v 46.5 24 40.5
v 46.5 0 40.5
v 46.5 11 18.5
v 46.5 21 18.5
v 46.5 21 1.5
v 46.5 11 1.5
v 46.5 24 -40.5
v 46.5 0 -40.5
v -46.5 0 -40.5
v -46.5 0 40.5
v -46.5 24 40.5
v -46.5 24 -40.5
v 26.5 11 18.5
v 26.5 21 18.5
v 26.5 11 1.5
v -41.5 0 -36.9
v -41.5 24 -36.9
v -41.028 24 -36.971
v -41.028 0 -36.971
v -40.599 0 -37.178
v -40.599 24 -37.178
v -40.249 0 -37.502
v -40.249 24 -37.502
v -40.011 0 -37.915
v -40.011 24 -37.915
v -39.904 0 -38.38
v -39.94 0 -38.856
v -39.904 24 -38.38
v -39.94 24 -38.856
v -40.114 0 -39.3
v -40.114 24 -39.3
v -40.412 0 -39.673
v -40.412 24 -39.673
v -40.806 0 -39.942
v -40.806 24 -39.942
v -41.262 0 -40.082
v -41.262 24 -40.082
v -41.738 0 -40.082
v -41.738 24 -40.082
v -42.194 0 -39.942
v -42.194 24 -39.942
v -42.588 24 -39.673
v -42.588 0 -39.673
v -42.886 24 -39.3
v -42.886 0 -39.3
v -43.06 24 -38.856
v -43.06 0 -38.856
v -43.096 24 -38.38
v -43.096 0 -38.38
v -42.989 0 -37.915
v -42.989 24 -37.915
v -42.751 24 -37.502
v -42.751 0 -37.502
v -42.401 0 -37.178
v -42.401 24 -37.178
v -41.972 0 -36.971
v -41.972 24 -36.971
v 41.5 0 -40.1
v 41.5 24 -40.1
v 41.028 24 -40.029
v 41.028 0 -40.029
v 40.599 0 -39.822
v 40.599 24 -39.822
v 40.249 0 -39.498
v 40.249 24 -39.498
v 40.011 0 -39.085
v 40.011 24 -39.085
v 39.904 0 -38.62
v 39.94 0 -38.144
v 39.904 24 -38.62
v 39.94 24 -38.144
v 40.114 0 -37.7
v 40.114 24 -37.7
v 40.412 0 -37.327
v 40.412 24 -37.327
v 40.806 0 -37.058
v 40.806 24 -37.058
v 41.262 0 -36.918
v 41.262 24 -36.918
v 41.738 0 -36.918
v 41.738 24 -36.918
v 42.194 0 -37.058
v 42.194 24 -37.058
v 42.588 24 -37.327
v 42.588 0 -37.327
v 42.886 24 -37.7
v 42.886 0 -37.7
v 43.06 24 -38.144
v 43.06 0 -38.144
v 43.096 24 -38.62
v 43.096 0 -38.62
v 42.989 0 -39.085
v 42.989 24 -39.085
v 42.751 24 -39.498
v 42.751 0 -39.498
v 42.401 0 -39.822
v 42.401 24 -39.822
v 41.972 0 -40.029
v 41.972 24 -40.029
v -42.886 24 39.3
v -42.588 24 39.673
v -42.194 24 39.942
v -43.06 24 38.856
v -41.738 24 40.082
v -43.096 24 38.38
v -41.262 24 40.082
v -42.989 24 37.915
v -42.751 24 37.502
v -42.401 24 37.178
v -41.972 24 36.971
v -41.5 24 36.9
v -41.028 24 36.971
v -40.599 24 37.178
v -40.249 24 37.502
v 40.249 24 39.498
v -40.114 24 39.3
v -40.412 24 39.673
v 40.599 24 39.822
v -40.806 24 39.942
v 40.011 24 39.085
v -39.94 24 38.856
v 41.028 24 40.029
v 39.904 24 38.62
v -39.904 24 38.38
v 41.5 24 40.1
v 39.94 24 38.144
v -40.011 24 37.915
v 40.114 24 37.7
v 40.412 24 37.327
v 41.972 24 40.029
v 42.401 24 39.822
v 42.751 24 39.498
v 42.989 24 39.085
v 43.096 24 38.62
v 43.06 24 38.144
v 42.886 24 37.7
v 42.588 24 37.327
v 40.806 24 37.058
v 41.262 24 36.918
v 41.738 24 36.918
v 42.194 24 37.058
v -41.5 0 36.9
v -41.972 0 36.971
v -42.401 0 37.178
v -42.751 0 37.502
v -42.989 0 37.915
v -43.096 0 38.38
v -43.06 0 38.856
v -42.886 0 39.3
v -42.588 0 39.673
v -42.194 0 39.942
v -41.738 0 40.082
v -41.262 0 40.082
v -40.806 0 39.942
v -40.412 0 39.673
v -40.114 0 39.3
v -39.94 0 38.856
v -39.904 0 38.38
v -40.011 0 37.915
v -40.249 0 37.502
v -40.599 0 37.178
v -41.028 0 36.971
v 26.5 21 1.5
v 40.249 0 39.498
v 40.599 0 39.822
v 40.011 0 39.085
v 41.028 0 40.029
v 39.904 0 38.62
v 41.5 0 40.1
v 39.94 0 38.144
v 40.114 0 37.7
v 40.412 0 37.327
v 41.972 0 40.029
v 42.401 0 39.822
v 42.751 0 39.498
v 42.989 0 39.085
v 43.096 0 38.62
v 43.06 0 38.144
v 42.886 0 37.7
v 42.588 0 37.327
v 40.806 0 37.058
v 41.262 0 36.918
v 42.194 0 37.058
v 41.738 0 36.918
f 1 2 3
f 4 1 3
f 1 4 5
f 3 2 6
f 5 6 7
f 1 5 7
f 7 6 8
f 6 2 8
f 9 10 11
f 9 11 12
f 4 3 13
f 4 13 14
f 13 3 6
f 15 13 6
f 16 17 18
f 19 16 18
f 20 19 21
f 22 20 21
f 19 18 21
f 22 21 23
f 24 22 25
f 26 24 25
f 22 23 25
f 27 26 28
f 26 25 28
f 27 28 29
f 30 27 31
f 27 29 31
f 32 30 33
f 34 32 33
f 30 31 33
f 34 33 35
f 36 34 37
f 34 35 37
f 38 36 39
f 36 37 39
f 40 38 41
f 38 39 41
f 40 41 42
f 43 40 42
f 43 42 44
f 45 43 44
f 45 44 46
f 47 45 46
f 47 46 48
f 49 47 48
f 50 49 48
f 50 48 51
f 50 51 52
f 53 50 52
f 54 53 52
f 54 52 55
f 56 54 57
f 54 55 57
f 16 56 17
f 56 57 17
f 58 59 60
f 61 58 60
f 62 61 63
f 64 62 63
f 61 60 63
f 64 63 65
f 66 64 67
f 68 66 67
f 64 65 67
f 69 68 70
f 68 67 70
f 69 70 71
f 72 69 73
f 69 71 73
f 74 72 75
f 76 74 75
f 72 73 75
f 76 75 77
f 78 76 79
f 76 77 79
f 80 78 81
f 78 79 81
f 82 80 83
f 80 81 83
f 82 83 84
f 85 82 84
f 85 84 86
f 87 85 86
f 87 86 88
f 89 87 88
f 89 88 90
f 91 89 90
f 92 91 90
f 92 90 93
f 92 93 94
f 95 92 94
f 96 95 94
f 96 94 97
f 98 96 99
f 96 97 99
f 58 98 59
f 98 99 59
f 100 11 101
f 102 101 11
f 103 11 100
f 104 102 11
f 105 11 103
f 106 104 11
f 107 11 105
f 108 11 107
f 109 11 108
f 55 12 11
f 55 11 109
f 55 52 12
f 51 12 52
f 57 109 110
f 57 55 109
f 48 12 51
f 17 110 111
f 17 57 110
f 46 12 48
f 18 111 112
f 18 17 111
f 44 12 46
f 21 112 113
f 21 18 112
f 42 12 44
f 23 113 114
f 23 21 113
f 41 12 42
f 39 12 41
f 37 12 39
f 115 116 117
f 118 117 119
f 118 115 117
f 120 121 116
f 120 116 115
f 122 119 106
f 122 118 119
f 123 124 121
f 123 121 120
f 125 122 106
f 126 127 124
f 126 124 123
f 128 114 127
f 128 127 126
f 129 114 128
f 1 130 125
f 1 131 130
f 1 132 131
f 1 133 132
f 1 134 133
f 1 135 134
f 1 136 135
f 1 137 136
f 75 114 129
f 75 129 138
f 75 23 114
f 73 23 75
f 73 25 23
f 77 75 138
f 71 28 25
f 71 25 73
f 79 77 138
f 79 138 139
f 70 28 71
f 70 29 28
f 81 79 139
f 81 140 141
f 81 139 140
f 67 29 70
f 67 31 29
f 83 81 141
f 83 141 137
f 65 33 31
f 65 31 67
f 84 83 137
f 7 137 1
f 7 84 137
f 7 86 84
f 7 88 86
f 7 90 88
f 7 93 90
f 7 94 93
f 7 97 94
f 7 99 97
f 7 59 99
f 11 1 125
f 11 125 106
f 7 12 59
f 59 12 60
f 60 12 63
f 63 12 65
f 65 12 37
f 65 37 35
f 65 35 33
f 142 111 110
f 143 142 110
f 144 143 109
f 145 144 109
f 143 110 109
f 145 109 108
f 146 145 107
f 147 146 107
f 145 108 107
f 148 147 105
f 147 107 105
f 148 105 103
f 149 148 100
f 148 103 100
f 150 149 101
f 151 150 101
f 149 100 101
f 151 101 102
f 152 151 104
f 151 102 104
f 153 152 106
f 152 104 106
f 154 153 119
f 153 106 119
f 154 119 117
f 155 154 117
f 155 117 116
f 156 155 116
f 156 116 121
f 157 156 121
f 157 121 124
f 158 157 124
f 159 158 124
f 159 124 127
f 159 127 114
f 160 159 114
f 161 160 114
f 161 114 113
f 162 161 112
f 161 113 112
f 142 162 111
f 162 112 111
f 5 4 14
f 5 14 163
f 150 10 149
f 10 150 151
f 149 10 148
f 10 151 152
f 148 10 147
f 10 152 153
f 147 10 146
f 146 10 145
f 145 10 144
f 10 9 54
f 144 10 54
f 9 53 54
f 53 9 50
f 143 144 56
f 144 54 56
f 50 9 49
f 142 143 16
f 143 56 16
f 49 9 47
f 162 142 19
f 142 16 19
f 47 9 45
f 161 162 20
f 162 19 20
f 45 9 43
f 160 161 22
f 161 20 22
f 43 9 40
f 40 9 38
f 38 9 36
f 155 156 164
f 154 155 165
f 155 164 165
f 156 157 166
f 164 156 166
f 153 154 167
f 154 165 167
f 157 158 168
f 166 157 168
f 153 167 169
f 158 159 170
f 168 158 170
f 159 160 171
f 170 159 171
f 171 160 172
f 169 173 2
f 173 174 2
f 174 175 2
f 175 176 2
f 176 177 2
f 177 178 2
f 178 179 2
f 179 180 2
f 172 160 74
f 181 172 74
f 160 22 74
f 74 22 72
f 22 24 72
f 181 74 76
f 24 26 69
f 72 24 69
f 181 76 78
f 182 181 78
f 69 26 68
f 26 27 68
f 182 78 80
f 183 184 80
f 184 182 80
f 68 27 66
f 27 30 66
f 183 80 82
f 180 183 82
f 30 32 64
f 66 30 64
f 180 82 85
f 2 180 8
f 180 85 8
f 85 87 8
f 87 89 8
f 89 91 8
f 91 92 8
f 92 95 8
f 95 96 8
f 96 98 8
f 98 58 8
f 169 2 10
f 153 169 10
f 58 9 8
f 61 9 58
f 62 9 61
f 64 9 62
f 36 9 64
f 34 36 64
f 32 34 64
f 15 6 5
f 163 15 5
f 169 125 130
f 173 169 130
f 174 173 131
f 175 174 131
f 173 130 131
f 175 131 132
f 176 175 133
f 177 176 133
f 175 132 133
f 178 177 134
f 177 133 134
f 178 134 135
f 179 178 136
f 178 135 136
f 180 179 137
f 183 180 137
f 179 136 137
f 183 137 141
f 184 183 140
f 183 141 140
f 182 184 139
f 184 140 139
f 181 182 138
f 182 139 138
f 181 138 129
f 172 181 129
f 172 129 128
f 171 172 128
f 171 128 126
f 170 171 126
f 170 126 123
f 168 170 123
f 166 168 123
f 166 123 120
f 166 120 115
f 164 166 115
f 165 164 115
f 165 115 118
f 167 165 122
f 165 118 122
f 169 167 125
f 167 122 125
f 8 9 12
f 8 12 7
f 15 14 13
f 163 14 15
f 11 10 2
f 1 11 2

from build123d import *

# Parameters (mm, degrees)
SKETCH1_W           = 93
SKETCH1_H           = 81
BOSS_EXTRUDE1_DEPTH = 24
SKETCH2_R           = 1.6
CUT_EXTRUDE1_DEPTH  = 24
SKETCH3_W           = 17
SKETCH3_H           = 10
CUT_EXTRUDE2_DEPTH  = 20


with BuildPart() as part:
    # Sketch1 → Boss-Extrude1 (new body)
    with BuildSketch(Plane(origin=(0, 0, 0), x_dir=(1, 0, 0), z_dir=(0, 1, 0))):
        Rectangle(SKETCH1_W, SKETCH1_H)
    extrude(amount=BOSS_EXTRUDE1_DEPTH)

    # Sketch2 → Cut-Extrude1 (cut)
    with BuildSketch(Plane(origin=(0, 24, 0), x_dir=(1, 0, 0), z_dir=(0, 1, 0))):
        with Locations(Location((-41.5, 38.5, 0), (0, 0, 270))):
            Circle(SKETCH2_R)
        with Locations(Location((-41.5, -38.5, 0), (0, 0, 90))):
            Circle(SKETCH2_R)
        with Locations(Location((41.5, -38.5, 0), (0, 0, 270))):
            Circle(SKETCH2_R)
        with Locations(Location((41.5, 38.5, 0), (0, 0, 90))):
            Circle(SKETCH2_R)
    extrude(amount=-CUT_EXTRUDE1_DEPTH, mode=Mode.SUBTRACT)

    # Sketch3 → Cut-Extrude2 (cut)
    with BuildSketch(Plane(origin=(46.5, 0, 0), x_dir=(0, 0, -1), z_dir=(1, 0, 0))):
        with Locations((-10, 16)):
            Rectangle(SKETCH3_W, SKETCH3_H)
    extrude(amount=-CUT_EXTRUDE2_DEPTH, mode=Mode.SUBTRACT)


solid = part.part
